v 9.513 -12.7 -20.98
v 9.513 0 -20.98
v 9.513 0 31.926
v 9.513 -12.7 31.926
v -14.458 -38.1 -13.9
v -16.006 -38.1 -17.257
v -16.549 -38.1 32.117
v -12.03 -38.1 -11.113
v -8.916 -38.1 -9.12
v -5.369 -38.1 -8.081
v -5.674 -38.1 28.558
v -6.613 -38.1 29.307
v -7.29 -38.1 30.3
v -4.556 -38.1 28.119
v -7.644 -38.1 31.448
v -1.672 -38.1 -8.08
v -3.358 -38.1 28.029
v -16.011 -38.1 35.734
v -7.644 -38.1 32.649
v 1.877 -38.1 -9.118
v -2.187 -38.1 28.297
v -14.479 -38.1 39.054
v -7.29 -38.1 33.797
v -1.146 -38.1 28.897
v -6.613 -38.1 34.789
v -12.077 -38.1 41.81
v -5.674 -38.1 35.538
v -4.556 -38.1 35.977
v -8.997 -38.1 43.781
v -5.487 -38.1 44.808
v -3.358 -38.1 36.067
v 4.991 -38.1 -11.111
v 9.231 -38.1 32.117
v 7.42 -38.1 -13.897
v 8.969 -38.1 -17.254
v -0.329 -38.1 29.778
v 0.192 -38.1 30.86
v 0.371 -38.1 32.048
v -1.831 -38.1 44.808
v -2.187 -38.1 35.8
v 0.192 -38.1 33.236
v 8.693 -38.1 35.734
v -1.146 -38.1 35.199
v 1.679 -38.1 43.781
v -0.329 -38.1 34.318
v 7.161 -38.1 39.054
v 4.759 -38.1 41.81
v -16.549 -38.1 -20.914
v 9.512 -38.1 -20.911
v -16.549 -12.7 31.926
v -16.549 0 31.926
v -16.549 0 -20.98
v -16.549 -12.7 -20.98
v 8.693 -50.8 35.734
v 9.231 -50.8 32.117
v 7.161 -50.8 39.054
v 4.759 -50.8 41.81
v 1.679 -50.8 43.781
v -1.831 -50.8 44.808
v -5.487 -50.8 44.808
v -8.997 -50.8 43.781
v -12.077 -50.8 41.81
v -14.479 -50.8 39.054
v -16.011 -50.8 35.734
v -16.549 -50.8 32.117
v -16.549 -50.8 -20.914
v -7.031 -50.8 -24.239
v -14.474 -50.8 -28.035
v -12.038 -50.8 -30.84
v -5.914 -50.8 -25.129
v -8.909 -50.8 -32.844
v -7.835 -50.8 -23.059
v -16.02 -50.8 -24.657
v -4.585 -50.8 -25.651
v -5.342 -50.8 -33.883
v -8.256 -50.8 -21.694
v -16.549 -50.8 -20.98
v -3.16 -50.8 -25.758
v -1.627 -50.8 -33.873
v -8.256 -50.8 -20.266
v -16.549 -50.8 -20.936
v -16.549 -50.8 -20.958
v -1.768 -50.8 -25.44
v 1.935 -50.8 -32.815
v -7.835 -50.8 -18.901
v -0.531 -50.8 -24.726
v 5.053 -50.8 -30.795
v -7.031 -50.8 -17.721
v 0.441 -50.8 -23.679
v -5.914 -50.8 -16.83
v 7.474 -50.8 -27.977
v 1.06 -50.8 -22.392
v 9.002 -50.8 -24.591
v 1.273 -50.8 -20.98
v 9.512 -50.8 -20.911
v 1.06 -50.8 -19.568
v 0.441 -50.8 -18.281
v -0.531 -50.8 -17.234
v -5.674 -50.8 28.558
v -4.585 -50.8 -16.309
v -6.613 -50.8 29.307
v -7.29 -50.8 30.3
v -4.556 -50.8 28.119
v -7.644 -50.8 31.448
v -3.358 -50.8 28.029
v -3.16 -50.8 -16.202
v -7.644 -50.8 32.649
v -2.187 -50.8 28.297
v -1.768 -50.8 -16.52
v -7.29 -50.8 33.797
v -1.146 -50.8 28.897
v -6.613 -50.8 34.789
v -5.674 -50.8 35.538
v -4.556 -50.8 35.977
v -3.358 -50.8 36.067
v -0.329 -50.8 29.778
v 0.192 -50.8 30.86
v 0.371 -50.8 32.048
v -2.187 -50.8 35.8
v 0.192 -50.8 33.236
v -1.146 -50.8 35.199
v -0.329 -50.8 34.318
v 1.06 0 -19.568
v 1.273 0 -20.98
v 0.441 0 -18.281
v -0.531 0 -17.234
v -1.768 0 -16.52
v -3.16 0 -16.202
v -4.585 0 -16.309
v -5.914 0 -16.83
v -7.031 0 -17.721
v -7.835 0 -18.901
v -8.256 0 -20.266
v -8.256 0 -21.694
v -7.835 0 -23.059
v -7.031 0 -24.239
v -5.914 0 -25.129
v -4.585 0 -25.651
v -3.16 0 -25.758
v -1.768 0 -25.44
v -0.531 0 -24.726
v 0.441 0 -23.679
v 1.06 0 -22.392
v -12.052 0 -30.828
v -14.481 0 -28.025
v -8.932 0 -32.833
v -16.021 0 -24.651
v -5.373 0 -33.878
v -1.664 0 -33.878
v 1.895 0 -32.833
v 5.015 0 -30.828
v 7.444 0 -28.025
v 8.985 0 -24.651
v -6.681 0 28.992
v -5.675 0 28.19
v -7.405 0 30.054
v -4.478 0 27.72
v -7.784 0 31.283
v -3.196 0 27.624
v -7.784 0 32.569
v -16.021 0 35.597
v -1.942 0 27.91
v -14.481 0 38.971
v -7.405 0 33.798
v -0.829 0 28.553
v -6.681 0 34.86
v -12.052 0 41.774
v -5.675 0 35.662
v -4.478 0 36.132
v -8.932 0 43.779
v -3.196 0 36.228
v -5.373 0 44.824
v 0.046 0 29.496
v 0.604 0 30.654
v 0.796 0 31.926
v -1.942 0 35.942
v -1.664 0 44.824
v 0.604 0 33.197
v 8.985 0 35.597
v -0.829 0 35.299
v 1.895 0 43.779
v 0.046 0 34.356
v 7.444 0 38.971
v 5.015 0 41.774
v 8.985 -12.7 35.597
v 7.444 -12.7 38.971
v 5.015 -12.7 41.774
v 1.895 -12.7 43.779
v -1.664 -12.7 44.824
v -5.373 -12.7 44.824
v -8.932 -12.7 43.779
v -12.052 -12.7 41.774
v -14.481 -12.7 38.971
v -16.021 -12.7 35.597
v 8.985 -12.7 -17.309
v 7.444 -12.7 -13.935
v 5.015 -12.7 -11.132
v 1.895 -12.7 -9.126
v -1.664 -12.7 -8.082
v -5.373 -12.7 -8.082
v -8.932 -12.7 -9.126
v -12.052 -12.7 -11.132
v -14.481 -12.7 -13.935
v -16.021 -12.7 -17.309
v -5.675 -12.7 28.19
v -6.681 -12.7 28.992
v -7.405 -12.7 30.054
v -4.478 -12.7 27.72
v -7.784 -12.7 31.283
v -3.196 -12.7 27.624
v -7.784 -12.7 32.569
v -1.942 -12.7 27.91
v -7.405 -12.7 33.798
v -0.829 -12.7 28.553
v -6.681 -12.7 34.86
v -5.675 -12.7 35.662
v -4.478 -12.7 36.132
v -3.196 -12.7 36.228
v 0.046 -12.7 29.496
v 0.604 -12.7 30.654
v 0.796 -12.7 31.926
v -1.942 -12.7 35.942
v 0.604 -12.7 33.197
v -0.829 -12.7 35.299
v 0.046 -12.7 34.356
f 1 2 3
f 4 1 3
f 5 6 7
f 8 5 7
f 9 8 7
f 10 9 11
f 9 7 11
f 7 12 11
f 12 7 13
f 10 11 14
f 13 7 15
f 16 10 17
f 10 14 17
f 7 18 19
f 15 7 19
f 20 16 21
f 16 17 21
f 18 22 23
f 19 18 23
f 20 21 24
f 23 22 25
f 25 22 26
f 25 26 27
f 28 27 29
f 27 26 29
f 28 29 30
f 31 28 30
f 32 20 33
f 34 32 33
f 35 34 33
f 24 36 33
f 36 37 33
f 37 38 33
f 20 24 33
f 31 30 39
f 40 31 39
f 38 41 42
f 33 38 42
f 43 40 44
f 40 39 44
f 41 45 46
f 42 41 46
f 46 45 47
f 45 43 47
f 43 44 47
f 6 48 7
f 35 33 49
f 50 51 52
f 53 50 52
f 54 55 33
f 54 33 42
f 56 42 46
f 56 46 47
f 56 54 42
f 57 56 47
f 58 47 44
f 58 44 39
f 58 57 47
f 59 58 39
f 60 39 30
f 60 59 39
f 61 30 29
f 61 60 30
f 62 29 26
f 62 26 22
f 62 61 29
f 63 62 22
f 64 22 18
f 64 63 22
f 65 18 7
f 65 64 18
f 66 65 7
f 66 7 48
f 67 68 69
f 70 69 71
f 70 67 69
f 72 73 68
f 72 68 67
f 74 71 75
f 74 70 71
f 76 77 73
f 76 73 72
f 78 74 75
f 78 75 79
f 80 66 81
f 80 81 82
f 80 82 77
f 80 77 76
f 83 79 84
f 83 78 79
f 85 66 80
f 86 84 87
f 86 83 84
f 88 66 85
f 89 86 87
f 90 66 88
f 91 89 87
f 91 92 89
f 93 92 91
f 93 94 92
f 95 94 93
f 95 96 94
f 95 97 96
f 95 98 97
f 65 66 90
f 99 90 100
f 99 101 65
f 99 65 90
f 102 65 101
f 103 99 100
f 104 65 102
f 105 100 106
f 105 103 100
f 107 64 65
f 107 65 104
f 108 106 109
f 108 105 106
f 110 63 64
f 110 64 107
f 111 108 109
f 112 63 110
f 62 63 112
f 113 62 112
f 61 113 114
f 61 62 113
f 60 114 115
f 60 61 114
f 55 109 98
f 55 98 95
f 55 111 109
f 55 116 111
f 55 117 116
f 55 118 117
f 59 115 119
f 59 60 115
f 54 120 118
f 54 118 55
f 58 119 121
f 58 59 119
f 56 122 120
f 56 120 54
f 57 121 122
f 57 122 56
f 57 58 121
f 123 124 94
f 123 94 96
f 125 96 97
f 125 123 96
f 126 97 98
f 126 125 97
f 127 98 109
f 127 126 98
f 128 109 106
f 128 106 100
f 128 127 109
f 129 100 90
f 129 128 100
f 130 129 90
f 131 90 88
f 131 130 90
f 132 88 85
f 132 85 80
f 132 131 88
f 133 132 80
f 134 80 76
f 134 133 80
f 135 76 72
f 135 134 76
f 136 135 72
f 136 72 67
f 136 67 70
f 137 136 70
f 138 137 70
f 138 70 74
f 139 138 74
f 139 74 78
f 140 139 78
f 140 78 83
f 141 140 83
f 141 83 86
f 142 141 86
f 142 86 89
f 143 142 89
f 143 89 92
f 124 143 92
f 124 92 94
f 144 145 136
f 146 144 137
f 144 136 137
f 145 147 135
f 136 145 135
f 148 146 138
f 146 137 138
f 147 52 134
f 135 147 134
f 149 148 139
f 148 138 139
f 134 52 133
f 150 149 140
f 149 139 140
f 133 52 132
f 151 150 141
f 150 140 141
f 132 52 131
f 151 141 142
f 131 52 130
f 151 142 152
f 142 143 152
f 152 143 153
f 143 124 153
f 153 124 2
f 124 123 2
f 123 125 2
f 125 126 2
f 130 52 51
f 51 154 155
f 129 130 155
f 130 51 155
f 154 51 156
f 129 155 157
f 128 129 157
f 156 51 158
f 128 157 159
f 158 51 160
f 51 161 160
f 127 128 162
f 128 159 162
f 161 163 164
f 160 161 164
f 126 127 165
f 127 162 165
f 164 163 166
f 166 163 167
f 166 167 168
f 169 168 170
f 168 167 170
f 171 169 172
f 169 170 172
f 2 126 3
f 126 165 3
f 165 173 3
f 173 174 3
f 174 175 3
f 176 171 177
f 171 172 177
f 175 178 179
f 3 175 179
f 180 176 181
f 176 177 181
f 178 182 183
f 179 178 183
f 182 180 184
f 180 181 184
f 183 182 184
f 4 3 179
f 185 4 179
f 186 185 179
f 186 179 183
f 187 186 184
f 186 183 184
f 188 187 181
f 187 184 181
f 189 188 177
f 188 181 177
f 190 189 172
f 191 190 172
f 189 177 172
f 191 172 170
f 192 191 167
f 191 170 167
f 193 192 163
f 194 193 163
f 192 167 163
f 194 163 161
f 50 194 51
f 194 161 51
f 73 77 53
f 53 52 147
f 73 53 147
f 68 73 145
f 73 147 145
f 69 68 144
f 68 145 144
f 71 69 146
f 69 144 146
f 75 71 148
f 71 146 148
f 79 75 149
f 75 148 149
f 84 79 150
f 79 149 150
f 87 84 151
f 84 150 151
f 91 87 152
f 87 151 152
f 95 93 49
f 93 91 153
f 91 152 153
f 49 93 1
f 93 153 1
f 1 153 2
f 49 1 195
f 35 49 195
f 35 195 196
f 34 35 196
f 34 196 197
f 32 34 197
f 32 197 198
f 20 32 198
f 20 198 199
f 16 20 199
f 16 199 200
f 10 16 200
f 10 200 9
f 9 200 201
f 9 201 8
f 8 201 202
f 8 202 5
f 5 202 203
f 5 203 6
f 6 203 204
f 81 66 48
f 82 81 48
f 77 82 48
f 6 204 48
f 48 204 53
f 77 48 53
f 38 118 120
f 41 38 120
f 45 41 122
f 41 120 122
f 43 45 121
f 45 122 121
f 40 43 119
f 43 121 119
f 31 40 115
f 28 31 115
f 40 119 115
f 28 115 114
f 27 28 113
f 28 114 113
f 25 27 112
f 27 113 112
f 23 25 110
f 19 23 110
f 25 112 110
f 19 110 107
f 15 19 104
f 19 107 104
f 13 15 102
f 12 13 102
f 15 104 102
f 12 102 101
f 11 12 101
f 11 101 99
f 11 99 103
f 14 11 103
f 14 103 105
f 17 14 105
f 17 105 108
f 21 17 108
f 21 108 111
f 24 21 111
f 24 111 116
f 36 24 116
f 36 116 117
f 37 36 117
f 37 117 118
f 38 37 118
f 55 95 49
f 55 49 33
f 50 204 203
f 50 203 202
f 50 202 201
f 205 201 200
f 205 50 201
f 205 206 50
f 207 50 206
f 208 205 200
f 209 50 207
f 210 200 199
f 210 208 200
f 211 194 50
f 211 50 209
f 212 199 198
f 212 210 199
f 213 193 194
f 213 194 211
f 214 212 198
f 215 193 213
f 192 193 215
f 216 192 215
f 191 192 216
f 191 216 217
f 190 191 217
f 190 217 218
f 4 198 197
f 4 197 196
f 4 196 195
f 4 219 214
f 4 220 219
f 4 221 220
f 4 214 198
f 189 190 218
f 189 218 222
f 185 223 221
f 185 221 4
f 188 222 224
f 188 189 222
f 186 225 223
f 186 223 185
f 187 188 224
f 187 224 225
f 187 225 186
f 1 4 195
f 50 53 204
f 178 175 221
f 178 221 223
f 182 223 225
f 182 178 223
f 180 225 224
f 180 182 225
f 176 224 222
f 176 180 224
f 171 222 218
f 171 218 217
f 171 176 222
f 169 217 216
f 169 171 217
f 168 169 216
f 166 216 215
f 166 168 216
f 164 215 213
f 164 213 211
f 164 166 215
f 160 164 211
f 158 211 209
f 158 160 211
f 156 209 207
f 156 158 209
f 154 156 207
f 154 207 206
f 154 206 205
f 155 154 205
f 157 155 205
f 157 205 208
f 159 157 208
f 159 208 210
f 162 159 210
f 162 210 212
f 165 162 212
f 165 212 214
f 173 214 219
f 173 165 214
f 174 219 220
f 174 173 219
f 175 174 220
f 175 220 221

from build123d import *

# Parameters (mm, degrees)
F0_R     = 4.3140137555
F0_R_2   = 4.7914191877
F1_DEPTH = 12.7
F2_DEPTH = 50.8
F3_R     = 4.4074532963
F4_DEPTH = 12.7
F5_R     = 4.030114566
F6_DEPTH = 25.4


# Not quite as in the source:
# - a feature names something its author has since deleted; it is built from what else it names


with BuildPart() as f1:
    # F0 (on Front) → F1 (new body)
    with BuildSketch(Plane.XZ):
        with BuildLine():
            ThreePointArc((9.5125902444, 31.9258160889), (-3.518355079, 44.9567614123), (-16.5493004024, 31.9258160889))
            Line((-16.5493004024, 31.9258160889), (-16.5493004024, -20.979821682))
            ThreePointArc((-16.5493004024, -20.979821682), (-3.518355079, -7.9488763586), (9.5125902444, -20.979821682))
            Line((9.5125902444, -20.979821682), (9.5125902444, 31.9258160889))
        make_face()
        with Locations((-3.518355079, 31.9258160889)):
            Circle(F0_R, mode=Mode.SUBTRACT)
        with BuildLine():
            ThreePointArc((9.5125902444, -20.979821682), (-3.518355079, -7.9488763586), (-16.5493004024, -20.979821682))
            ThreePointArc((-16.5493004024, -20.979821682), (-3.518355079, -34.0107670054), (9.5125902444, -20.979821682))
        make_face()
        with Locations((-3.518355079, -20.979821682)):
            Circle(F0_R_2, mode=Mode.SUBTRACT)
    extrude(amount=F1_DEPTH)

    # F0 (on Front) → F2 (join)
    with BuildSketch(Plane.XZ):
        with BuildLine():
            ThreePointArc((9.5125902444, -20.979821682), (-3.518355079, -7.9488763586), (-16.5493004024, -20.979821682))
            ThreePointArc((-16.5493004024, -20.979821682), (-3.518355079, -34.0107670054), (9.5125902444, -20.979821682))
        make_face()
        with Locations((-3.518355079, -20.979821682)):
            Circle(F0_R_2, mode=Mode.SUBTRACT)
    extrude(amount=F2_DEPTH)

    # F3 (on face) → F4 (join)
    with BuildSketch(Plane.XZ.offset(50.8)):
        with BuildLine():
            Line((-16.5491351407, 32.1166292513), (-16.5491351407, -21.0454494616))
            ThreePointArc((-16.5491351407, -21.0454494616), (-3.5857392287, -7.9490505844), (9.5124068178, -20.9106811633))
            Line((9.5124068178, -20.9106811633), (9.2310467735, 32.1166292513))
            ThreePointArc((9.2310467735, 32.1166292513), (-3.6590441836, 44.9385075287), (-16.5491351407, 32.1166292513))
        make_face()
        with Locations((-3.6590441836, 32.0482351251)):
            Circle(F3_R, mode=Mode.SUBTRACT)
        with Locations((-3.6590441836, 32.0482351251)):
            Circle(F3_R)
    extrude(amount=-F4_DEPTH)

    # F5 (on face) → F6 (cut)
    with BuildSketch(Plane.XZ.offset(50.8)):
        with Locations((-3.6590441836, 32.0482351251)):
            Circle(F5_R)
    extrude(amount=-F6_DEPTH, mode=Mode.SUBTRACT)


solid = f1.part
